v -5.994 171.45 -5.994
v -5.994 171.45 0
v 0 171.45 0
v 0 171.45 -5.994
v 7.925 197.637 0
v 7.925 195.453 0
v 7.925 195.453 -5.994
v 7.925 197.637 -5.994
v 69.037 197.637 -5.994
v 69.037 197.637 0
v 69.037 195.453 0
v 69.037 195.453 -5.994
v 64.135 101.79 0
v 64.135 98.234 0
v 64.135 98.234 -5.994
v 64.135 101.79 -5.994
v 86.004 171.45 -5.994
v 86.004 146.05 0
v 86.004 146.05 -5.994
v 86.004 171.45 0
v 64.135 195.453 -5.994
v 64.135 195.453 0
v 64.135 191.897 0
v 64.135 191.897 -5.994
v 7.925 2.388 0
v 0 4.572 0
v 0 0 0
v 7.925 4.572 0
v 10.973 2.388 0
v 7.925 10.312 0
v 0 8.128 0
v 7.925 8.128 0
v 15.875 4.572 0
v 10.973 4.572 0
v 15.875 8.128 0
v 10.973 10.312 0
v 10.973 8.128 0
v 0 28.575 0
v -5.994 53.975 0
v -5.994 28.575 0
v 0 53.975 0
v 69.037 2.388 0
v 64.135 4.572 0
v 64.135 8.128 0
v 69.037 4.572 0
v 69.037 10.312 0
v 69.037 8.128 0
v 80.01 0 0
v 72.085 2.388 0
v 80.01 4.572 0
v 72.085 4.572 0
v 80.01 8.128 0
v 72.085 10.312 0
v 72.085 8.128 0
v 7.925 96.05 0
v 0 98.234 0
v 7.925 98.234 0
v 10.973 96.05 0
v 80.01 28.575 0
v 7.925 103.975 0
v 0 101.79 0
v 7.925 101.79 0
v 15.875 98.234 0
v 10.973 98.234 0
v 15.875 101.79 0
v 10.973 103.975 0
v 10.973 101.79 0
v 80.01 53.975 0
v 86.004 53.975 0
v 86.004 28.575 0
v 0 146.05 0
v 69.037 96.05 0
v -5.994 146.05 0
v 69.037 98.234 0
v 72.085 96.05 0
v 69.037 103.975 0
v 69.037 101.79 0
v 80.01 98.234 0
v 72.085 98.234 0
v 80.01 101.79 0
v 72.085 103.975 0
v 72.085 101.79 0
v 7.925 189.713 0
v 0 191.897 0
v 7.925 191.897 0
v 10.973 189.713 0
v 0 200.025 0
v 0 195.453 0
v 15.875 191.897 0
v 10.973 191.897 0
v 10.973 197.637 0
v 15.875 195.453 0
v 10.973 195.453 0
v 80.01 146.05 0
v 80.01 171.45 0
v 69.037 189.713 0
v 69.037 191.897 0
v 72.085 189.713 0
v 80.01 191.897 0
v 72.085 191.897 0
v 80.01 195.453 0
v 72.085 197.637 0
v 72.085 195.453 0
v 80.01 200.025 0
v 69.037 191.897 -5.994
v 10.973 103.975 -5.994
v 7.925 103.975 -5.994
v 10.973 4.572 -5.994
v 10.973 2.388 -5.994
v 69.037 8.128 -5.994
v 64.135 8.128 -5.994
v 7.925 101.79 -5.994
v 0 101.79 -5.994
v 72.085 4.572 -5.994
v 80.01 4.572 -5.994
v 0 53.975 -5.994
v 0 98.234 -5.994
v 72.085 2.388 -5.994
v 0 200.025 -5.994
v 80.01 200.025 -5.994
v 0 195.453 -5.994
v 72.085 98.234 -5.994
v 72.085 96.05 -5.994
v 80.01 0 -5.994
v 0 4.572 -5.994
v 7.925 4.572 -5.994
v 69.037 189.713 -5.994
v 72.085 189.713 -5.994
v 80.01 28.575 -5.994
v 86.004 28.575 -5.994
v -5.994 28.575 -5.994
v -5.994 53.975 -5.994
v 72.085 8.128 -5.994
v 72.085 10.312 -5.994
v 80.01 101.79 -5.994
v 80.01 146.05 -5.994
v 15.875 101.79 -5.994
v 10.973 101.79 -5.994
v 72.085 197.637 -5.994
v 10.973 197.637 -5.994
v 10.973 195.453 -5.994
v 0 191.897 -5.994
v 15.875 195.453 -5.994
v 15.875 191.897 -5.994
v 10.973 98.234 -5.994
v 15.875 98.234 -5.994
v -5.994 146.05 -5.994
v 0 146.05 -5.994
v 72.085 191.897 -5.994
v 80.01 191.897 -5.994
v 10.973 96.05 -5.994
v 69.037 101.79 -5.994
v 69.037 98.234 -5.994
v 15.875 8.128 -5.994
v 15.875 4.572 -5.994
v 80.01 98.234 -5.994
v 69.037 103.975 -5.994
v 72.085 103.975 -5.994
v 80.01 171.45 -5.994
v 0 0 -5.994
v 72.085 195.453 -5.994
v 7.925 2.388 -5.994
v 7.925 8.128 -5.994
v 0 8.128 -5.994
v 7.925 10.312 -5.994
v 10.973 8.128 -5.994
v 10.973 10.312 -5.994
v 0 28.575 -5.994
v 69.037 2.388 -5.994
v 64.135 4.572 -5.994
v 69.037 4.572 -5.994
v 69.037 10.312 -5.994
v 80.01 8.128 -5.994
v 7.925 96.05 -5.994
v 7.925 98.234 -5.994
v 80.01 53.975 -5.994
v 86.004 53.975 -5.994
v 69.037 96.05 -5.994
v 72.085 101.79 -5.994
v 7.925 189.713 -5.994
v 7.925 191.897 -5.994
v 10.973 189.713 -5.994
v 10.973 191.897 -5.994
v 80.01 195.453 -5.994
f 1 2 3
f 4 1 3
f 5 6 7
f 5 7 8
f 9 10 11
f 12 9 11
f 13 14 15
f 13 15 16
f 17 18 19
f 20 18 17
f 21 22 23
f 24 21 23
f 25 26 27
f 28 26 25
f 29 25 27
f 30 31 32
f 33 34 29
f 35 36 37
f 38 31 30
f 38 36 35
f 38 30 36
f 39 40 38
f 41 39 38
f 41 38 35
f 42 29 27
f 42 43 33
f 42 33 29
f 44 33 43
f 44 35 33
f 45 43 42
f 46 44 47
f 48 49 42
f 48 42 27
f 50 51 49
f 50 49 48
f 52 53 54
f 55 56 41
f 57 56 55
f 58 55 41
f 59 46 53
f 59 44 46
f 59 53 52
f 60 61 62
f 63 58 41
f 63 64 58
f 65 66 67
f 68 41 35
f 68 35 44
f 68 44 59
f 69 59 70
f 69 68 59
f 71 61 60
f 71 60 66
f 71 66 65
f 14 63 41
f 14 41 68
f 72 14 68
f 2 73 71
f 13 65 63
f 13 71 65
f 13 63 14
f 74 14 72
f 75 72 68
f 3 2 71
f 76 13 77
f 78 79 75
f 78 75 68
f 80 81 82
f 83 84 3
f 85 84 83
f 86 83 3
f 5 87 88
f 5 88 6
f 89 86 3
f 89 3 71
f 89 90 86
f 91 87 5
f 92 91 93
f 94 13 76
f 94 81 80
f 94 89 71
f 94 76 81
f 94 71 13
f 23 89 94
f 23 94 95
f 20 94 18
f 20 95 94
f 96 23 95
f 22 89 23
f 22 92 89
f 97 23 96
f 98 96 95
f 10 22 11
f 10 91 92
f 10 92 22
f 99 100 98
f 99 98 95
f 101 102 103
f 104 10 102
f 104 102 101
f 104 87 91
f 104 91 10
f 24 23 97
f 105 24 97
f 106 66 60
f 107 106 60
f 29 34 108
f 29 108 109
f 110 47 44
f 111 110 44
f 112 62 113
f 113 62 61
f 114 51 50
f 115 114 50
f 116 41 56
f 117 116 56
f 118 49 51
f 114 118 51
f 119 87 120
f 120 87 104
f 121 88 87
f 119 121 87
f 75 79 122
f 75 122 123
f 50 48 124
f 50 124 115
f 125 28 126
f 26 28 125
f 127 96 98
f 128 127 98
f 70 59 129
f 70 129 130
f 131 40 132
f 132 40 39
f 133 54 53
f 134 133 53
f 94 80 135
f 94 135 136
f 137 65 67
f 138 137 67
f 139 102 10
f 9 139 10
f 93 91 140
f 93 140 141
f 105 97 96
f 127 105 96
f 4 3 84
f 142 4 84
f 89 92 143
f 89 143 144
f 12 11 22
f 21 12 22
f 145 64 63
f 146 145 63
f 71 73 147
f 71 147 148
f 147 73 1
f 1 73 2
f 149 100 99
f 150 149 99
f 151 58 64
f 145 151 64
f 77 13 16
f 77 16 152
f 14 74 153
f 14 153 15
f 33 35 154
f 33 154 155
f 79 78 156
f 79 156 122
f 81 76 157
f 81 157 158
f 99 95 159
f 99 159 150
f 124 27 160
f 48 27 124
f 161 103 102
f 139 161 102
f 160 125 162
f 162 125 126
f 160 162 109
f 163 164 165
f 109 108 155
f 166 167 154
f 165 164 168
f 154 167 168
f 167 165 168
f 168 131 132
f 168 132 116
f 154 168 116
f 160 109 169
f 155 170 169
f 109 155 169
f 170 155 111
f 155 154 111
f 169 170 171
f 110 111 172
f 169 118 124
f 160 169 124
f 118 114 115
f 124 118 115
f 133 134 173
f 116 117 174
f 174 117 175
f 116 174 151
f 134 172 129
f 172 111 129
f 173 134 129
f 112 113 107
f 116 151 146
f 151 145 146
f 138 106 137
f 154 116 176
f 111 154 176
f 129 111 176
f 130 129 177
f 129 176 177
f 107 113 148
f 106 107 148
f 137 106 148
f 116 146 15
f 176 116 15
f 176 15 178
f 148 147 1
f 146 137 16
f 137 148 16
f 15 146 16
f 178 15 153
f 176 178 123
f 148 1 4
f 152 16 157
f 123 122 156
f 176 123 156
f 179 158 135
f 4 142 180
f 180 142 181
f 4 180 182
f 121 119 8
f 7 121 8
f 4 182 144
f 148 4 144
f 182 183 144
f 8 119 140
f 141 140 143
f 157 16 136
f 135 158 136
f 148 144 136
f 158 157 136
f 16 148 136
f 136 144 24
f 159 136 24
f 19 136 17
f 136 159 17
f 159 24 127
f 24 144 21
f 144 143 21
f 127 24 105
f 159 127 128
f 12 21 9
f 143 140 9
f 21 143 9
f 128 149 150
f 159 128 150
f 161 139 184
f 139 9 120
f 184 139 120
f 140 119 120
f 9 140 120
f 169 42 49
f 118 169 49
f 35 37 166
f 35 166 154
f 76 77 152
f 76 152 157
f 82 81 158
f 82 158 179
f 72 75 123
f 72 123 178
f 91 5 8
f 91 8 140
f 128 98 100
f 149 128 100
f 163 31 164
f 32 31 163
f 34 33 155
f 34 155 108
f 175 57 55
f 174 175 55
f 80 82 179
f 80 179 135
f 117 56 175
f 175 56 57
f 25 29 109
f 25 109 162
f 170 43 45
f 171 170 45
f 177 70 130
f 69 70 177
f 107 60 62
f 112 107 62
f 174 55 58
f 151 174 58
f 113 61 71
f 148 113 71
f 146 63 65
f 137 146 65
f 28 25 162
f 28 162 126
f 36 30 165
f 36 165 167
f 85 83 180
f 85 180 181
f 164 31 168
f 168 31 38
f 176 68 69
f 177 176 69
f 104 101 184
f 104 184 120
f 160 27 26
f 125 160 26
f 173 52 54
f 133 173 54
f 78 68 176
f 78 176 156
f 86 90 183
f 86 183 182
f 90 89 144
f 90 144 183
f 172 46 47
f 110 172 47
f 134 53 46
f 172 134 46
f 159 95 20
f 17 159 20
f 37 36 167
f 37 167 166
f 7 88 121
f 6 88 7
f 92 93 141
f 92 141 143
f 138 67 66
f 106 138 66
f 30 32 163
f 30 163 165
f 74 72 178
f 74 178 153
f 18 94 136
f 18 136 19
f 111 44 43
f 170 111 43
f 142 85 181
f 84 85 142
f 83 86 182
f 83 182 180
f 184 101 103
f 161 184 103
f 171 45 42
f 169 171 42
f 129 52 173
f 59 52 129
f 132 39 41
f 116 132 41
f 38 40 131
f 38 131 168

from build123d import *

# Parameters (mm, degrees)
SKETCH1_W           = 80.01
SKETCH1_H           = 200.025
BOSS_EXTRUDE1_DEPTH = 5.9944
SKETCH2_W           = 5.9944
SKETCH2_H           = 25.4
BOSS_EXTRUDE2_DEPTH = 5.9944
CUT_EXTRUDE1_DEPTH  = 6.9944


with BuildPart() as part:
    # Sketch1 → Boss-Extrude1 (new body)
    with BuildSketch(Plane.XY):
        with Locations((40.005, 100.0125)):
            Rectangle(SKETCH1_W, SKETCH1_H)
    extrude(amount=-BOSS_EXTRUDE1_DEPTH)

    # Sketch2 → Boss-Extrude2 (add)
    with BuildSketch(Plane.XY):
        with Locations((83.0072, 158.75)):
            Rectangle(SKETCH2_W, SKETCH2_H)
        with Locations((-2.9972, 158.75)):
            Rectangle(SKETCH2_W, SKETCH2_H)
        with Locations((-2.9972, 41.275)):
            Rectangle(SKETCH2_W, SKETCH2_H)
        with Locations((83.0072, 41.275)):
            Rectangle(SKETCH2_W, SKETCH2_H)
    extrude(amount=-BOSS_EXTRUDE2_DEPTH)

    # Sketch3 → Cut-Extrude1 (cut, through all)
    with BuildSketch(Plane.XY):
        Polygon((80.01, 195.453), (72.0852, 195.453), (72.0852, 197.6374), (69.0372, 197.6374), (69.0372, 195.453), (64.135, 195.453), (64.135, 191.897), (69.0372, 191.897), (69.0372, 189.7126), (72.0852, 189.7126), (72.0852, 191.897), (80.01, 191.897), align=None)
        Polygon((69.0372, 8.128), (64.135, 8.128), (64.135, 4.572), (69.0372, 4.572), (69.0372, 2.3876), (72.0852, 2.3876), (72.0852, 4.572), (80.01, 4.572), (80.01, 8.128), (72.0852, 8.128), (72.0852, 10.3124), (69.0372, 10.3124), align=None)
        Polygon((69.0372, 96.0501), (69.0372, 98.2345), (64.135, 98.2345), (64.135, 101.7905), (69.0372, 101.7905), (69.0372, 103.9749), (72.0852, 103.9749), (72.0852, 101.7905), (80.01, 101.7905), (80.01, 98.2345), (72.0852, 98.2345), (72.0852, 96.0501), align=None)
        Polygon((10.9728, 10.3124), (10.9728, 8.128), (15.875, 8.128), (15.875, 4.572), (10.9728, 4.572), (10.9728, 2.3876), (7.9248, 2.3876), (7.9248, 4.572), (0, 4.572), (0, 8.128), (7.9248, 8.128), (7.9248, 10.3124), align=None)
        Polygon((7.9248, 96.0501), (10.9728, 96.0501), (10.9728, 98.2345), (15.875, 98.2345), (15.875, 101.7905), (10.9728, 101.7905), (10.9728, 103.9749), (7.9248, 103.9749), (7.9248, 101.7905), (0, 101.7905), (0, 98.2345), (7.9248, 98.2345), align=None)
        Polygon((0, 195.453), (7.9248, 195.453), (7.9248, 197.6374), (10.9728, 197.6374), (10.9728, 195.453), (15.875, 195.453), (15.875, 191.897), (10.9728, 191.897), (10.9728, 189.7126), (7.9248, 189.7126), (7.9248, 191.897), (0, 191.897), align=None)
    extrude(amount=-CUT_EXTRUDE1_DEPTH, mode=Mode.SUBTRACT)


solid = part.part
